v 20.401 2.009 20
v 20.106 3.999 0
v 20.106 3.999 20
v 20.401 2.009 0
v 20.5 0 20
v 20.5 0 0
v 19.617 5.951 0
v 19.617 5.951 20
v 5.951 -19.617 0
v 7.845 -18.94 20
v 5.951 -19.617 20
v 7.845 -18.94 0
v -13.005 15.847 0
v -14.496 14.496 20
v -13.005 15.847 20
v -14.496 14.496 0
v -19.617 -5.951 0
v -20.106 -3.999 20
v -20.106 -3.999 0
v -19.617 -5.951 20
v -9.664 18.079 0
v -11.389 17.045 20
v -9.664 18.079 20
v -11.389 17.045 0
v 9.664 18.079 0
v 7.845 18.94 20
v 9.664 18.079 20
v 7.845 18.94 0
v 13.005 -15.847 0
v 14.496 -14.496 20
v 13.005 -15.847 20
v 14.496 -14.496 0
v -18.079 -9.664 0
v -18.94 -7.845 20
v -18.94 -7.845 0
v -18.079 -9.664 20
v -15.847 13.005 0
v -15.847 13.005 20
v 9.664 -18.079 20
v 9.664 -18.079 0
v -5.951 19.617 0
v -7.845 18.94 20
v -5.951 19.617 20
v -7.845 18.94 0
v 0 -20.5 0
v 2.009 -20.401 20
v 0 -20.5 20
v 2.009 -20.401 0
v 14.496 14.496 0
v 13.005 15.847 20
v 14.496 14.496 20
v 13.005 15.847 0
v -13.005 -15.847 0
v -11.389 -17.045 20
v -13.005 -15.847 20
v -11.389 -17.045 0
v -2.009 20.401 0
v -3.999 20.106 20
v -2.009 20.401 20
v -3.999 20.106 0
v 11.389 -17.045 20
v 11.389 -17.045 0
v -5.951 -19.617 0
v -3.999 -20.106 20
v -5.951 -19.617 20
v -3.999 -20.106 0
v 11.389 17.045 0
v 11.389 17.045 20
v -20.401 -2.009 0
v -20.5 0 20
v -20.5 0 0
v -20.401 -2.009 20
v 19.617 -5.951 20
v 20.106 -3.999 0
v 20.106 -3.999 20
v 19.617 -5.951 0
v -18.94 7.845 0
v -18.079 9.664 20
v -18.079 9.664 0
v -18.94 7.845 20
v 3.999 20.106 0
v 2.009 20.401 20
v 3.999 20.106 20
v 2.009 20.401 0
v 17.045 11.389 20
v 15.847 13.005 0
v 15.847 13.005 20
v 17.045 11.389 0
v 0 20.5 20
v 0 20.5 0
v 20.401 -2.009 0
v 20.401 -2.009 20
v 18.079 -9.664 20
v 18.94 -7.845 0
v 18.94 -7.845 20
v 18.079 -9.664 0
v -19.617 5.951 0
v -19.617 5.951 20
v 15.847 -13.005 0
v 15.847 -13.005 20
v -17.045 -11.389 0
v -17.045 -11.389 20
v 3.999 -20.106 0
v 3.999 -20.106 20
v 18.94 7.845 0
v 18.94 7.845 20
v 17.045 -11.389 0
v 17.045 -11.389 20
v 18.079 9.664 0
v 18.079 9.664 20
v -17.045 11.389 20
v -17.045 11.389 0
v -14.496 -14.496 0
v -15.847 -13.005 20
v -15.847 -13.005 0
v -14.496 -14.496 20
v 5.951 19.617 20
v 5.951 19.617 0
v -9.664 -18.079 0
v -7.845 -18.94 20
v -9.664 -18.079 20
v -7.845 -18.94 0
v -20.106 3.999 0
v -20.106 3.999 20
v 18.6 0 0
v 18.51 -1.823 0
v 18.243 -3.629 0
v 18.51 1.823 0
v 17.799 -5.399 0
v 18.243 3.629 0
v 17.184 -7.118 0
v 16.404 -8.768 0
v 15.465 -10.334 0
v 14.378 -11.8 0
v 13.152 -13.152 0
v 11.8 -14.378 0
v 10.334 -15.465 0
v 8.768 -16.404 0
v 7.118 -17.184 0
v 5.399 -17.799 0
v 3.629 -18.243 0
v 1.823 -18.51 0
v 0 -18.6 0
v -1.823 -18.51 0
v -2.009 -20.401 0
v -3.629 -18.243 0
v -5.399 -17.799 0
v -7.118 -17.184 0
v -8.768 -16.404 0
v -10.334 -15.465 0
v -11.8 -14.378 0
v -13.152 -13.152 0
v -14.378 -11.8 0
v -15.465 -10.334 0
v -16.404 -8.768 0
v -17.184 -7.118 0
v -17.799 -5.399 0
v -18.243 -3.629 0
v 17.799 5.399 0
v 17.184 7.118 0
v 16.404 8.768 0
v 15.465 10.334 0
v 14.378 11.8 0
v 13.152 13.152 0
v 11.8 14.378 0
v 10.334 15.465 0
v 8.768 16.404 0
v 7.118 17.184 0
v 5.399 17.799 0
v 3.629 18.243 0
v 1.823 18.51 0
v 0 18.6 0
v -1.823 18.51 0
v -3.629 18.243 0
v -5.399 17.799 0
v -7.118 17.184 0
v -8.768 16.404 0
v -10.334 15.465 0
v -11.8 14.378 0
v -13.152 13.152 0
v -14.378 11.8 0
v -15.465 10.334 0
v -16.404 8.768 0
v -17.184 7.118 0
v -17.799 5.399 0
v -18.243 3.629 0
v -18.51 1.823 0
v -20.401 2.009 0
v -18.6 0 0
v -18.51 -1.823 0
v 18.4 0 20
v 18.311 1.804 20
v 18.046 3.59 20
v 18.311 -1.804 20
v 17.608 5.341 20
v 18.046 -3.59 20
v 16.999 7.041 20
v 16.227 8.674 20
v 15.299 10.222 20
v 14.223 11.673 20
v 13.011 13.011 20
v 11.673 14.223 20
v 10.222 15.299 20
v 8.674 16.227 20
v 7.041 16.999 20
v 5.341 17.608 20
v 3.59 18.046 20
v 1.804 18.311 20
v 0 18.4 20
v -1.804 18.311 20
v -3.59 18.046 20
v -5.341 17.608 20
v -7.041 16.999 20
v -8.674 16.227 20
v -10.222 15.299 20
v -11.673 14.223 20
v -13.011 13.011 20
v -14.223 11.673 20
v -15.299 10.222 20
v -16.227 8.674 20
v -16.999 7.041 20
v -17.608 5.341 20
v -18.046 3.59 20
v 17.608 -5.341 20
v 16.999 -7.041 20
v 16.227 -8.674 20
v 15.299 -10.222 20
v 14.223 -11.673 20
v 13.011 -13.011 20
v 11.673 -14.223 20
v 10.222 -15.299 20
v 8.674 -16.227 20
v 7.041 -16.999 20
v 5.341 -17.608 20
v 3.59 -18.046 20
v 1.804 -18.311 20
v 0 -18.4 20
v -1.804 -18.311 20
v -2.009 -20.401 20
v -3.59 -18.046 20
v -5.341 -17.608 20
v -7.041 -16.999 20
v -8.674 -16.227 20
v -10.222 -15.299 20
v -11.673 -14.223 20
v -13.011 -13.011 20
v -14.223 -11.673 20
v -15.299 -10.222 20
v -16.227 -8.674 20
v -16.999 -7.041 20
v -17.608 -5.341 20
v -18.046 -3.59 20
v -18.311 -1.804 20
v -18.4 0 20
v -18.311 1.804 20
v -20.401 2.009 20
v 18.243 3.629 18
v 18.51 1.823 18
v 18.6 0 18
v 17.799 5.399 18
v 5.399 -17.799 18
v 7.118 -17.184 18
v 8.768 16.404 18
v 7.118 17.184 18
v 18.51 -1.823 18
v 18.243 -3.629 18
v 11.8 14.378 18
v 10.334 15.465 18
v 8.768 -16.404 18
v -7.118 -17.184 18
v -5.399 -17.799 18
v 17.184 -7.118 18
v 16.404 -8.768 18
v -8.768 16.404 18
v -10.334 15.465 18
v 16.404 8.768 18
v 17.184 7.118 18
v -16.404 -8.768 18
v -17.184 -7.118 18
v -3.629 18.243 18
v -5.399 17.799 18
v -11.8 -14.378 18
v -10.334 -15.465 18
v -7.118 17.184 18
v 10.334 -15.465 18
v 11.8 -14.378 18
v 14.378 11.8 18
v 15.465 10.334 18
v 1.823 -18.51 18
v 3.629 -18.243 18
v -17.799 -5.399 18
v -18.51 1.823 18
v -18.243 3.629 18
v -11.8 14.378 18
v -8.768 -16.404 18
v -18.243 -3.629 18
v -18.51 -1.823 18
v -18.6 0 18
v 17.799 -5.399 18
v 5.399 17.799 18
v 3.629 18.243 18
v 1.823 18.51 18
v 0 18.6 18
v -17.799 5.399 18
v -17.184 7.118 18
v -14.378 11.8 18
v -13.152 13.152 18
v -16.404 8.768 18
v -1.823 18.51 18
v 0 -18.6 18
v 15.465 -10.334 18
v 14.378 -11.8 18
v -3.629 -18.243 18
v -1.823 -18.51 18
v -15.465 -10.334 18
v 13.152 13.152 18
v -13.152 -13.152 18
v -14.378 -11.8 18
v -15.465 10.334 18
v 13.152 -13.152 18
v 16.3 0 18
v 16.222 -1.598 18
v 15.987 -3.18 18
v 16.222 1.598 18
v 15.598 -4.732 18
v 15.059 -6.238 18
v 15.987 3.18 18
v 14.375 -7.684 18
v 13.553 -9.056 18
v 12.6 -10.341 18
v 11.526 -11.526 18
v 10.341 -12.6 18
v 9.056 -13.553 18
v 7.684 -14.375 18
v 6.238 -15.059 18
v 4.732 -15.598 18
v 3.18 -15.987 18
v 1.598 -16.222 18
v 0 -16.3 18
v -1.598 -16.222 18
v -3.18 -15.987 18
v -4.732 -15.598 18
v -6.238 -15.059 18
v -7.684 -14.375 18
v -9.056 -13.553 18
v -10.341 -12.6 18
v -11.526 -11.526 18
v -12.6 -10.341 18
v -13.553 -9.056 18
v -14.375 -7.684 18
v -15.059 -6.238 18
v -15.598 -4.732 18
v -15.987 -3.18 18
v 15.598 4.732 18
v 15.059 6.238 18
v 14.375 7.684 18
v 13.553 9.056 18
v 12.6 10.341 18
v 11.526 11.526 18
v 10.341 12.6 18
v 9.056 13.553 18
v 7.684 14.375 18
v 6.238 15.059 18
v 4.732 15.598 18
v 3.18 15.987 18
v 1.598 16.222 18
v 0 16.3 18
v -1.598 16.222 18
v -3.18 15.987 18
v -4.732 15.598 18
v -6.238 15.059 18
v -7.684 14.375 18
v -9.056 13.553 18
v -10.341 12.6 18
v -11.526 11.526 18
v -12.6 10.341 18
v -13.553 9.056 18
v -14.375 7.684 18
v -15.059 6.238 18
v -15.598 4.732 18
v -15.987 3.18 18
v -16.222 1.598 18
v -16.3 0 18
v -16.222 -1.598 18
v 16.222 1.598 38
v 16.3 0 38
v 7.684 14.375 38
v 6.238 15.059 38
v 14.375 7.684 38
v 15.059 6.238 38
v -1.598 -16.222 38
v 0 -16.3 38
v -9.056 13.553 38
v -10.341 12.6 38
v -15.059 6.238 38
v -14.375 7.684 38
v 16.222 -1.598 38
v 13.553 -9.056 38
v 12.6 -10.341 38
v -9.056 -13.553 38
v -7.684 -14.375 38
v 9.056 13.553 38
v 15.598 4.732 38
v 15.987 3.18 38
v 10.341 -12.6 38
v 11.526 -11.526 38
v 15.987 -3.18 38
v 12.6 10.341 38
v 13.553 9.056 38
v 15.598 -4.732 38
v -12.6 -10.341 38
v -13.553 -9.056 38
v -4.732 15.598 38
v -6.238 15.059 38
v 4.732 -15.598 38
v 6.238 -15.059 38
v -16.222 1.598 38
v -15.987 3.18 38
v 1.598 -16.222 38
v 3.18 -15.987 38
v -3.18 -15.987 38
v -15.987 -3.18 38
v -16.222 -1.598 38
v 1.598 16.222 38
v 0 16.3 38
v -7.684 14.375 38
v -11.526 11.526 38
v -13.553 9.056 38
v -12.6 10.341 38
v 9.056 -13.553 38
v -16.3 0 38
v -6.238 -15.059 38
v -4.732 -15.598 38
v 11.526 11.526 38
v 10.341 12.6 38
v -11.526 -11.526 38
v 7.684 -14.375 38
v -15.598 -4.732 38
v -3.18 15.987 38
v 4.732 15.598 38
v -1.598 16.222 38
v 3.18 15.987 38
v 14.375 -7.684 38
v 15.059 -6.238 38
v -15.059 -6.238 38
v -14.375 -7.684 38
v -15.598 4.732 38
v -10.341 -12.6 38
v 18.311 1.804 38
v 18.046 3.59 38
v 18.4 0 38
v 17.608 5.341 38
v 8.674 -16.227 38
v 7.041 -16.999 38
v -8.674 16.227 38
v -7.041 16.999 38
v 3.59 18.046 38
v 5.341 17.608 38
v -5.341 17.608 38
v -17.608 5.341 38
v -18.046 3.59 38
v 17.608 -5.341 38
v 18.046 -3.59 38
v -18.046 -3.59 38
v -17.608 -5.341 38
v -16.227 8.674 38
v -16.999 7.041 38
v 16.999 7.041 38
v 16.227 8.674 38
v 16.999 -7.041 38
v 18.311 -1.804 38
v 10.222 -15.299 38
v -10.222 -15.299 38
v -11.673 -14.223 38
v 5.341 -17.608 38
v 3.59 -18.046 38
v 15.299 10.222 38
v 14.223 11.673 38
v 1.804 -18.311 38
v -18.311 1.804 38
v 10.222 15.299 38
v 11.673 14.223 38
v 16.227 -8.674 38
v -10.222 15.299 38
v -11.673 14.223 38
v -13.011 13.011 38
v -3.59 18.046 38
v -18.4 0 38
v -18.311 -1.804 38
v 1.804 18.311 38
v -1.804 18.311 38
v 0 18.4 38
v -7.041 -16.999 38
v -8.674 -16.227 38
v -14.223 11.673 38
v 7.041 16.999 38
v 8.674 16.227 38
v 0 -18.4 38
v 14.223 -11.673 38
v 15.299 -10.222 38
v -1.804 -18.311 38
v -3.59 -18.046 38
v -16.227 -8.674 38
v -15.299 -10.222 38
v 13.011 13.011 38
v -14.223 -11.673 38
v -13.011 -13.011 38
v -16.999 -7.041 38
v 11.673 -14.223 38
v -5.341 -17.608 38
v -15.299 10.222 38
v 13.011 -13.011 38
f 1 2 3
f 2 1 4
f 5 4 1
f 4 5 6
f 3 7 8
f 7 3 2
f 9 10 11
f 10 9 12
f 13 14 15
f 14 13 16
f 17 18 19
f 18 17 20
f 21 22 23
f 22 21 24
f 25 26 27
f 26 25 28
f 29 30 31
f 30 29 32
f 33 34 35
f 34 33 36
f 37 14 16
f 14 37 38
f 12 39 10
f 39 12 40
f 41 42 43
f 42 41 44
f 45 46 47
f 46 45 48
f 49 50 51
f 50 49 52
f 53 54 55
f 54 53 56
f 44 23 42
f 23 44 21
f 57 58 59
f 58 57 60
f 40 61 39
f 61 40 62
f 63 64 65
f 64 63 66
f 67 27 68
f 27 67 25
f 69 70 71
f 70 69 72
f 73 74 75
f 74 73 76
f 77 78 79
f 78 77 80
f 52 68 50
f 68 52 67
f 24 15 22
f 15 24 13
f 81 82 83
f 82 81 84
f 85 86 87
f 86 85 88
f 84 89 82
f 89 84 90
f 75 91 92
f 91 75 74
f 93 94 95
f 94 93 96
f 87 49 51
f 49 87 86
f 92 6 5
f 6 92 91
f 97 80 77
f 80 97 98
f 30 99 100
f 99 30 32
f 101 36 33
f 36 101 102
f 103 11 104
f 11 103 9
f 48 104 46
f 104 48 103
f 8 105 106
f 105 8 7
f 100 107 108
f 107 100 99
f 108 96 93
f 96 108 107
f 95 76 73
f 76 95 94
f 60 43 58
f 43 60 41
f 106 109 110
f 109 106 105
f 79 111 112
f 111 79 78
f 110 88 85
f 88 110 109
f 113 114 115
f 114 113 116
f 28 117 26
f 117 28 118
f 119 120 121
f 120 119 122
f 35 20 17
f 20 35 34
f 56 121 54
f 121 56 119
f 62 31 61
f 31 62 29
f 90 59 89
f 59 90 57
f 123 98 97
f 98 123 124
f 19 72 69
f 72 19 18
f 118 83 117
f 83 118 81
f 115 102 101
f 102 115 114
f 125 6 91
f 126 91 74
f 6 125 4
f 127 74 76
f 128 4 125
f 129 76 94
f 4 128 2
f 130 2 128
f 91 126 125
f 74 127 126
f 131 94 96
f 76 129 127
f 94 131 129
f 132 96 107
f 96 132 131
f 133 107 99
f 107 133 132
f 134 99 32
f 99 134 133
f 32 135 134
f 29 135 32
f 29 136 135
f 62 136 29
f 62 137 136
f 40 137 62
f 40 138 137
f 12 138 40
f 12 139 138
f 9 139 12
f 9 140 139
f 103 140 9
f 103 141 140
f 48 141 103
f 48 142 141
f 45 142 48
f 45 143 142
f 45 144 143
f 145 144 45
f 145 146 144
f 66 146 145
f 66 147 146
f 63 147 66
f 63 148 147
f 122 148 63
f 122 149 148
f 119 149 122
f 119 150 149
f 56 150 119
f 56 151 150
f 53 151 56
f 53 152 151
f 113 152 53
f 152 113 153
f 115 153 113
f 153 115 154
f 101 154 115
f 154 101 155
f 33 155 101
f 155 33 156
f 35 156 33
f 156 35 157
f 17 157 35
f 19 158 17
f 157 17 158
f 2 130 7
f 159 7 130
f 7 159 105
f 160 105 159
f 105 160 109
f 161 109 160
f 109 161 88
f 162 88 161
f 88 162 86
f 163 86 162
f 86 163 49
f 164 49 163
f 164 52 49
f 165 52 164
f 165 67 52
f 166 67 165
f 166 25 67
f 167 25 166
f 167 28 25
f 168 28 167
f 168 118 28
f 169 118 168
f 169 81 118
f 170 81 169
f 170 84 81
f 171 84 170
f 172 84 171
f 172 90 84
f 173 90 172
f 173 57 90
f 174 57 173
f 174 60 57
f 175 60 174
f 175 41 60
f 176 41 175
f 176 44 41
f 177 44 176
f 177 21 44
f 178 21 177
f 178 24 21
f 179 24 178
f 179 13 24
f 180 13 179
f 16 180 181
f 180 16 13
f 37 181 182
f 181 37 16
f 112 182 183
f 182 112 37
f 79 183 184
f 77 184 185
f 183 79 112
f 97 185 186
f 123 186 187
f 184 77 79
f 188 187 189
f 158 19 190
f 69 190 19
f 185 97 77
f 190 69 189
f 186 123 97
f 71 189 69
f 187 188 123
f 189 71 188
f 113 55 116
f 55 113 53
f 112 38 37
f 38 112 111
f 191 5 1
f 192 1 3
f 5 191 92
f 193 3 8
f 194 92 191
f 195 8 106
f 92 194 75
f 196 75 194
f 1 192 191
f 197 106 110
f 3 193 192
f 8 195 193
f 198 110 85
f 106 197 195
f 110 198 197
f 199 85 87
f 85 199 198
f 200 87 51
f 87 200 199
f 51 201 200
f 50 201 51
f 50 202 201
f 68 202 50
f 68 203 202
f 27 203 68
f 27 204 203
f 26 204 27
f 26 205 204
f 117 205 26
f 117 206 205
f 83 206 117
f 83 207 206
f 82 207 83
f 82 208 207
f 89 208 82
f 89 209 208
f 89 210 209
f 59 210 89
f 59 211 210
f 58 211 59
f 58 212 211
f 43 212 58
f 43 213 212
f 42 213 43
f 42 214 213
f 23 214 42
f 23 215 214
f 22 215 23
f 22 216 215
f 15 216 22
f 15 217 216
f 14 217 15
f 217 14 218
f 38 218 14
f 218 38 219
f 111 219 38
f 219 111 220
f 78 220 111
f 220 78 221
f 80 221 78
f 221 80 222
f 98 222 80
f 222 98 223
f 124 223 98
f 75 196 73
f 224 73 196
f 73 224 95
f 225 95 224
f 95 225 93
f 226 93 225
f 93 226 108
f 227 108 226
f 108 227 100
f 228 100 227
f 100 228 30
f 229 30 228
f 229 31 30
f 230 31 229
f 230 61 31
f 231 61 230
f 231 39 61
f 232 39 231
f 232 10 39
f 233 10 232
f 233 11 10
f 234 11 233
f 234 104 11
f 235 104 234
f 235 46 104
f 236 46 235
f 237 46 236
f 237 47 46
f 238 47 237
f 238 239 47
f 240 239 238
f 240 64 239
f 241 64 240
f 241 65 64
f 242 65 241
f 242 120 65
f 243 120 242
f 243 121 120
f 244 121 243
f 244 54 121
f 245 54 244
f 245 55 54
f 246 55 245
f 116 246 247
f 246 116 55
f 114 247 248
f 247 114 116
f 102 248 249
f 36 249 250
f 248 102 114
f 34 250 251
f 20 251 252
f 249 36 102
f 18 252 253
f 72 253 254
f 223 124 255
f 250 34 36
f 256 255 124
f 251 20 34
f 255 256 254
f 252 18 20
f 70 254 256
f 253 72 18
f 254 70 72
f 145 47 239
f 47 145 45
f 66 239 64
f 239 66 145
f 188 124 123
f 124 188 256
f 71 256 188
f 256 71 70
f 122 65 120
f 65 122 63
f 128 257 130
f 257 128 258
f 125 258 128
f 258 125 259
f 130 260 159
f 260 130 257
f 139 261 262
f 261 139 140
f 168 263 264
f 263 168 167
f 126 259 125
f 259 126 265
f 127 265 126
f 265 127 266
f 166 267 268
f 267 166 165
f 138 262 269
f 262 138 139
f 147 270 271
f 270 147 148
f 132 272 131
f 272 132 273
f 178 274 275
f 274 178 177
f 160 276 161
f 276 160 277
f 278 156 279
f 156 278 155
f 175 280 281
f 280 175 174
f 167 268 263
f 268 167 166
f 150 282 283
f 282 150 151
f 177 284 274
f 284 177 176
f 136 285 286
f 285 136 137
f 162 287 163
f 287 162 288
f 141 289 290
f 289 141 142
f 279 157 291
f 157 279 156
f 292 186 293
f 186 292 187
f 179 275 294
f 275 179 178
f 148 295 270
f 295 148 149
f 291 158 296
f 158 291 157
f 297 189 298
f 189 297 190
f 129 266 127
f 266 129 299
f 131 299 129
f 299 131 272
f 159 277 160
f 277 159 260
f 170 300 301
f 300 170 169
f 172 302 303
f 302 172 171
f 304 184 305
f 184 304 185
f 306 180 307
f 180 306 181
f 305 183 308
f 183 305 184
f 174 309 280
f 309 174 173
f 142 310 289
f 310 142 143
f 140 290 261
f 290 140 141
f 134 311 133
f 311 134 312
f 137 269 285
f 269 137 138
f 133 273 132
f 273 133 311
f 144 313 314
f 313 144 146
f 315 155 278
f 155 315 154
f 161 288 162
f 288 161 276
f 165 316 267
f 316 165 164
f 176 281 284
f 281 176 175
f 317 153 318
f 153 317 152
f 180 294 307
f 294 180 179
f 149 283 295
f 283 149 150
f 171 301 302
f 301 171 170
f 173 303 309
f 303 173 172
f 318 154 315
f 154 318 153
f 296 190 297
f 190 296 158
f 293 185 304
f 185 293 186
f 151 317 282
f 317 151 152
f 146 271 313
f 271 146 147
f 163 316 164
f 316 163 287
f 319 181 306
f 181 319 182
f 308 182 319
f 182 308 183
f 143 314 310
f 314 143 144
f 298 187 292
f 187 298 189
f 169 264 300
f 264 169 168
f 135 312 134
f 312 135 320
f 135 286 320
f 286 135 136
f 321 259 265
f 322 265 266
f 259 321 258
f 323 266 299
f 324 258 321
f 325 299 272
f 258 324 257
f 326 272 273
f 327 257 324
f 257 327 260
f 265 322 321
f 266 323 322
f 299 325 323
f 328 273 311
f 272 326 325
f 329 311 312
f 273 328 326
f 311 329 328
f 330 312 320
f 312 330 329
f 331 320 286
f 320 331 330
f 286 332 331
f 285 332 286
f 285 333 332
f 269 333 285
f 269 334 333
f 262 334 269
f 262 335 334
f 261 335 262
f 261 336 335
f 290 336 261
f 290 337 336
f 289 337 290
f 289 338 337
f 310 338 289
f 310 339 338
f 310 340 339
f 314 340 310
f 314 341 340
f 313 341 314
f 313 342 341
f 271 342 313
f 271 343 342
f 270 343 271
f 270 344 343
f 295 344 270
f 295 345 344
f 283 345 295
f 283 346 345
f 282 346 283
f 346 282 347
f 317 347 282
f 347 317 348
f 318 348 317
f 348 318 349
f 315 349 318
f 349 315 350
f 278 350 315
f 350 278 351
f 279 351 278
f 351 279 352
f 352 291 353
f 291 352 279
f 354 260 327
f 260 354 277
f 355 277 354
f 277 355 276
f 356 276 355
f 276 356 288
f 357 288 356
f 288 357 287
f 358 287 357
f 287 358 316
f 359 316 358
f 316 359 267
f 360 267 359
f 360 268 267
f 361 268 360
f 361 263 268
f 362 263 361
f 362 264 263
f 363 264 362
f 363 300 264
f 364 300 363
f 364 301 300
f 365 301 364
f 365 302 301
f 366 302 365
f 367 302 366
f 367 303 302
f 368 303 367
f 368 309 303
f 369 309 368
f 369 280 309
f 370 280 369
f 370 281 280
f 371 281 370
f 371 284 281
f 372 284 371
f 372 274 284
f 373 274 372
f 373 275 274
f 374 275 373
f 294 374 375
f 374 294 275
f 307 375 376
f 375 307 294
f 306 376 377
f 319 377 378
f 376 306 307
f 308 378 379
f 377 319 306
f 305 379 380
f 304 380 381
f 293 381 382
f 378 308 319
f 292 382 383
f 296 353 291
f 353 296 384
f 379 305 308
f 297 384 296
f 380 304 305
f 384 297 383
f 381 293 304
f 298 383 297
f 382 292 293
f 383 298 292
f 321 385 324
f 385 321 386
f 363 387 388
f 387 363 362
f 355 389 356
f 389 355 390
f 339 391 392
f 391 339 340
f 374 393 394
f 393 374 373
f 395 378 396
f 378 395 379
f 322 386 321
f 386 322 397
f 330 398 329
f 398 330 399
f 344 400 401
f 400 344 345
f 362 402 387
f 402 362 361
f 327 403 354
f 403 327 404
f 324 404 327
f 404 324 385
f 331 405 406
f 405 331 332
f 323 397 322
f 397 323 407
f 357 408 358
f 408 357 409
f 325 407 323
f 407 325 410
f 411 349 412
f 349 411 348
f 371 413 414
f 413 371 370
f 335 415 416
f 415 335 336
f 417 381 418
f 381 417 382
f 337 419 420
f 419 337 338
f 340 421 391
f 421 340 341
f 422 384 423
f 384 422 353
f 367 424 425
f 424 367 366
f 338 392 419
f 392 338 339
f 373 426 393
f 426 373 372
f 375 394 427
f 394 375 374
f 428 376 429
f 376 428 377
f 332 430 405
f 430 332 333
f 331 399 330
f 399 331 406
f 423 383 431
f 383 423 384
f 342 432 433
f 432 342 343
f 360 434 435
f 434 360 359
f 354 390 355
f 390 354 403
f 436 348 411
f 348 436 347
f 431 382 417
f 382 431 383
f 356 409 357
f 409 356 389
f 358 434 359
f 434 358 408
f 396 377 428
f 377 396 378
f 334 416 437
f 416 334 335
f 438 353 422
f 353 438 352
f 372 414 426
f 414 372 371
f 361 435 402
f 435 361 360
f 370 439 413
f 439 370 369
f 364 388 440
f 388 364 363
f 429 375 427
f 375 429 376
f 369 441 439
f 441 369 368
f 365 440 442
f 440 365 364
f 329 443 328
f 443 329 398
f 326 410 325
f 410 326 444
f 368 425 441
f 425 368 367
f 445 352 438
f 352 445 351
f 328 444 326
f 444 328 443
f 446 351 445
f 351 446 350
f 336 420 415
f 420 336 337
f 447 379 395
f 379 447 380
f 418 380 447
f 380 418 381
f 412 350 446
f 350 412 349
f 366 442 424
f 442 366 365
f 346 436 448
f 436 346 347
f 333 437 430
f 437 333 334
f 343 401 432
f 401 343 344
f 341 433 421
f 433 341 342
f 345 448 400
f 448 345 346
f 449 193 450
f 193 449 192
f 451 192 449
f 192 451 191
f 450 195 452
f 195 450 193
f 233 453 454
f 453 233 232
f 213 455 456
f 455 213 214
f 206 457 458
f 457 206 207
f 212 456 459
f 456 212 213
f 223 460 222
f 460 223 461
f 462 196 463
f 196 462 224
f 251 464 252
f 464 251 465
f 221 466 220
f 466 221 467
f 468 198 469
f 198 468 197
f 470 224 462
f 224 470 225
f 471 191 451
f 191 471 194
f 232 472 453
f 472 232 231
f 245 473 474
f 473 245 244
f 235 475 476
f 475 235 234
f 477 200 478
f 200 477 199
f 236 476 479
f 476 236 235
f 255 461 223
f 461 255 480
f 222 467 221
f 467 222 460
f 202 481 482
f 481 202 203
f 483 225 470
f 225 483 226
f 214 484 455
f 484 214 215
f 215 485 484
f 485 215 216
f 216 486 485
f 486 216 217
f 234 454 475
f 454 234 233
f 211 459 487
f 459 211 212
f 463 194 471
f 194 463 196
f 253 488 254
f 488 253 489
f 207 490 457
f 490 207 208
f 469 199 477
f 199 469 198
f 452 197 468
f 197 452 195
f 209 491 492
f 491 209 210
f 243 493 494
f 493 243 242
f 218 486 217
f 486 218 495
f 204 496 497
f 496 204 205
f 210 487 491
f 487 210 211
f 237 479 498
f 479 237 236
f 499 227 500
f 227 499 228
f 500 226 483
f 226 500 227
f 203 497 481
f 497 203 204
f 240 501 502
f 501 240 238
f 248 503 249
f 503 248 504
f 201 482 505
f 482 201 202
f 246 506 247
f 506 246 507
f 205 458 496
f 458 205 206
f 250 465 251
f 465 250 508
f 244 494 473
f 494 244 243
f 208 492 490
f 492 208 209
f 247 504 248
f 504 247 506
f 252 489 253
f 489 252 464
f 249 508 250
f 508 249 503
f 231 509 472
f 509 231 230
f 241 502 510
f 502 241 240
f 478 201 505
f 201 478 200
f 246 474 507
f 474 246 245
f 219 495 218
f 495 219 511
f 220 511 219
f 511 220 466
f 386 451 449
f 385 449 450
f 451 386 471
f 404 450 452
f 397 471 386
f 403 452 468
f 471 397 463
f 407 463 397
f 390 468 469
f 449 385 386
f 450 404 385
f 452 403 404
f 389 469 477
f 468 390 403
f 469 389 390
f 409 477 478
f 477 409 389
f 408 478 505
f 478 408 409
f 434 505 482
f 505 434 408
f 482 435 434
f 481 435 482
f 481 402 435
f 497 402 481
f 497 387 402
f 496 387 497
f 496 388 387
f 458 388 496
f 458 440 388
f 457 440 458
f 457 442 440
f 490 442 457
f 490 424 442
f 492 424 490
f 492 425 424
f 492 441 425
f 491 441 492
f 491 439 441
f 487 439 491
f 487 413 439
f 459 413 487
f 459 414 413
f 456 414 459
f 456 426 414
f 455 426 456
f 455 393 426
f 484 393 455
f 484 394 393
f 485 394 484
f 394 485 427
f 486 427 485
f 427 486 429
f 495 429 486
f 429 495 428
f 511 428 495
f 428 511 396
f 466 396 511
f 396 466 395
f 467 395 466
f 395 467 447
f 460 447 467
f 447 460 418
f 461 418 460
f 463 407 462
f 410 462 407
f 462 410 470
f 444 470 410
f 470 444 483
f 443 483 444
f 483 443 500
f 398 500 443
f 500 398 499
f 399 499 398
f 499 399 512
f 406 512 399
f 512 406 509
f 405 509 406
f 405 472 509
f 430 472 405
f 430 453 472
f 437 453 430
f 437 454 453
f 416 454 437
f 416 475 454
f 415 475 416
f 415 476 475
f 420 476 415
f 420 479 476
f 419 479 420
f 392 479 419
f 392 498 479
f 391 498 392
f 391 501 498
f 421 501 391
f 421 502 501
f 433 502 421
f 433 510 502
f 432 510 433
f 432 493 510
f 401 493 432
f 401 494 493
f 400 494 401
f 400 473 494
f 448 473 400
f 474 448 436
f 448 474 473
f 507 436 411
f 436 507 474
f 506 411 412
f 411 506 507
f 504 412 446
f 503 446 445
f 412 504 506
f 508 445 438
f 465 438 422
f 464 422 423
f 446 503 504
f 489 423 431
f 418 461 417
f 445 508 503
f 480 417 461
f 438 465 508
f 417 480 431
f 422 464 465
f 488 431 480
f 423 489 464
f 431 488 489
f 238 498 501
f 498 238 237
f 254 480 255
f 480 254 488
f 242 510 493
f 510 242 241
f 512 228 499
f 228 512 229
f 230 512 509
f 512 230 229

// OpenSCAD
$base_height = 20;

$base_outer_diameter = 20.5;
$base_inner_diameter = 18.6;

$top_height = 18;
$top_outer_diameter = 18.4;
$top_inner_diameter = 16.3;

$toal_height = $base_height + $top_height;

$min_base_height = 18;

if($base_height < $min_base_height) {
    $base_height = $min_base_height;
}


$fn = 64;

union() {
    difference() {
        cylinder(h = $base_height, r = $base_outer_diameter);
        cylinder(h = $base_height, r = $base_inner_diameter);
    }
    
    difference() {
        translate([0, 0, $base_height - 2]) cylinder(h = 2, r = $base_inner_diameter);
        translate([0, 0, $base_height - 2]) cylinder(h = 2, r = $top_inner_diameter);
    }
    
    translate([0, 0, $base_height]) difference() {
        cylinder(h = $top_height, r = $top_outer_diameter);
        cylinder(h = $top_height, r = $top_inner_diameter);
    }
    
}
